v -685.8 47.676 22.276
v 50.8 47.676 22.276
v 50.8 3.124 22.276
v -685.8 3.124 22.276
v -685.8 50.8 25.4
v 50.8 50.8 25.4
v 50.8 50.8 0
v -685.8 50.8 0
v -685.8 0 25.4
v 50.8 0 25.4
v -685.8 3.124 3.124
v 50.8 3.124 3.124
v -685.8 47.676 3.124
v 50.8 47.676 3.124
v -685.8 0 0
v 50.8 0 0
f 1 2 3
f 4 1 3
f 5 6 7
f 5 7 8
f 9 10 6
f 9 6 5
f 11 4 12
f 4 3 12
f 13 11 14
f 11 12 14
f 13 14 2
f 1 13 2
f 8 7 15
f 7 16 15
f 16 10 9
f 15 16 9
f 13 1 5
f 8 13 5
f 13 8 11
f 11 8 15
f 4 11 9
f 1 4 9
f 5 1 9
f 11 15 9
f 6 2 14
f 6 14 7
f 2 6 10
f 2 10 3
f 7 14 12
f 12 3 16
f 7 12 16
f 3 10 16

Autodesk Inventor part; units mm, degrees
ref_plane "YZ Plane" through (0, 0, 0) normal (1, 0, 0) x (0, 1, 0)
ref_plane "XZ Plane" through (0, 0, 0) normal (0, 1, 0) x (-1, 0, 0)
ref_plane "XY Plane" through (0, 0, 0) normal (0, 0, 1) x (1, 0, 0)
sketch "Sketch1" plane through (0, 0, 0) normal (0, 1, 0) x (-1, 0, 0)
  line L0 (0, 25.4) -> (685.8, 25.4)
  line L1 (0, 0) -> (685.8, 0)
  line L2 (685.8, 0) -> (685.8, 25.4)
  line L3 (0, 0) -> (-50.8, 0)
  line L4 (0, 25.4) -> (-50.8, 25.4)
  line L5 (-50.8, 25.4) -> (-50.8, 0)
  dimension "d0" = 25.4
  dimension "d1" = 685.8
  dimension "d20" = 50.8
extrude "Extrusion1" add sketch "Sketch1" along normal blind 50.8
sketch "Sketch6" plane through (50.8, 0, 25.4) normal (1, 0, 0) x (0, 0, -1)
  line L0 (0, 50.8) -> (0, 0)
  line L1 (0, 0) -> (25.4, 0)
  line L2 (25.4, 0) -> (25.4, 50.8)
  line L3 (25.4, 50.8) -> (0, 50.8)
  line L4 (25.4, 50.8) -> (0, 50.8) projected
  line L5 (3.1242, 47.6758) -> (3.1242, 3.1242)
  line L6 (3.1242, 3.1242) -> (22.2758, 3.1242)
  line L7 (22.2758, 3.1242) -> (22.2758, 47.6758)
  line L8 (22.2758, 47.6758) -> (3.1242, 47.6758)
  dimension "d21" = 3.1242
extrude "Extrusion4" cut sketch "Sketch6" against normal blind 736.6 contours L8 L7 L6 L5
sketch "Sketch7" plane through (0, 50.8, 0) normal (0, 1, 0) x (1, 0, 0)
  point P0 (0, 0)
  point P1 (0, -12.7)
properties part number "Arm" material "Aluminum 6061"
